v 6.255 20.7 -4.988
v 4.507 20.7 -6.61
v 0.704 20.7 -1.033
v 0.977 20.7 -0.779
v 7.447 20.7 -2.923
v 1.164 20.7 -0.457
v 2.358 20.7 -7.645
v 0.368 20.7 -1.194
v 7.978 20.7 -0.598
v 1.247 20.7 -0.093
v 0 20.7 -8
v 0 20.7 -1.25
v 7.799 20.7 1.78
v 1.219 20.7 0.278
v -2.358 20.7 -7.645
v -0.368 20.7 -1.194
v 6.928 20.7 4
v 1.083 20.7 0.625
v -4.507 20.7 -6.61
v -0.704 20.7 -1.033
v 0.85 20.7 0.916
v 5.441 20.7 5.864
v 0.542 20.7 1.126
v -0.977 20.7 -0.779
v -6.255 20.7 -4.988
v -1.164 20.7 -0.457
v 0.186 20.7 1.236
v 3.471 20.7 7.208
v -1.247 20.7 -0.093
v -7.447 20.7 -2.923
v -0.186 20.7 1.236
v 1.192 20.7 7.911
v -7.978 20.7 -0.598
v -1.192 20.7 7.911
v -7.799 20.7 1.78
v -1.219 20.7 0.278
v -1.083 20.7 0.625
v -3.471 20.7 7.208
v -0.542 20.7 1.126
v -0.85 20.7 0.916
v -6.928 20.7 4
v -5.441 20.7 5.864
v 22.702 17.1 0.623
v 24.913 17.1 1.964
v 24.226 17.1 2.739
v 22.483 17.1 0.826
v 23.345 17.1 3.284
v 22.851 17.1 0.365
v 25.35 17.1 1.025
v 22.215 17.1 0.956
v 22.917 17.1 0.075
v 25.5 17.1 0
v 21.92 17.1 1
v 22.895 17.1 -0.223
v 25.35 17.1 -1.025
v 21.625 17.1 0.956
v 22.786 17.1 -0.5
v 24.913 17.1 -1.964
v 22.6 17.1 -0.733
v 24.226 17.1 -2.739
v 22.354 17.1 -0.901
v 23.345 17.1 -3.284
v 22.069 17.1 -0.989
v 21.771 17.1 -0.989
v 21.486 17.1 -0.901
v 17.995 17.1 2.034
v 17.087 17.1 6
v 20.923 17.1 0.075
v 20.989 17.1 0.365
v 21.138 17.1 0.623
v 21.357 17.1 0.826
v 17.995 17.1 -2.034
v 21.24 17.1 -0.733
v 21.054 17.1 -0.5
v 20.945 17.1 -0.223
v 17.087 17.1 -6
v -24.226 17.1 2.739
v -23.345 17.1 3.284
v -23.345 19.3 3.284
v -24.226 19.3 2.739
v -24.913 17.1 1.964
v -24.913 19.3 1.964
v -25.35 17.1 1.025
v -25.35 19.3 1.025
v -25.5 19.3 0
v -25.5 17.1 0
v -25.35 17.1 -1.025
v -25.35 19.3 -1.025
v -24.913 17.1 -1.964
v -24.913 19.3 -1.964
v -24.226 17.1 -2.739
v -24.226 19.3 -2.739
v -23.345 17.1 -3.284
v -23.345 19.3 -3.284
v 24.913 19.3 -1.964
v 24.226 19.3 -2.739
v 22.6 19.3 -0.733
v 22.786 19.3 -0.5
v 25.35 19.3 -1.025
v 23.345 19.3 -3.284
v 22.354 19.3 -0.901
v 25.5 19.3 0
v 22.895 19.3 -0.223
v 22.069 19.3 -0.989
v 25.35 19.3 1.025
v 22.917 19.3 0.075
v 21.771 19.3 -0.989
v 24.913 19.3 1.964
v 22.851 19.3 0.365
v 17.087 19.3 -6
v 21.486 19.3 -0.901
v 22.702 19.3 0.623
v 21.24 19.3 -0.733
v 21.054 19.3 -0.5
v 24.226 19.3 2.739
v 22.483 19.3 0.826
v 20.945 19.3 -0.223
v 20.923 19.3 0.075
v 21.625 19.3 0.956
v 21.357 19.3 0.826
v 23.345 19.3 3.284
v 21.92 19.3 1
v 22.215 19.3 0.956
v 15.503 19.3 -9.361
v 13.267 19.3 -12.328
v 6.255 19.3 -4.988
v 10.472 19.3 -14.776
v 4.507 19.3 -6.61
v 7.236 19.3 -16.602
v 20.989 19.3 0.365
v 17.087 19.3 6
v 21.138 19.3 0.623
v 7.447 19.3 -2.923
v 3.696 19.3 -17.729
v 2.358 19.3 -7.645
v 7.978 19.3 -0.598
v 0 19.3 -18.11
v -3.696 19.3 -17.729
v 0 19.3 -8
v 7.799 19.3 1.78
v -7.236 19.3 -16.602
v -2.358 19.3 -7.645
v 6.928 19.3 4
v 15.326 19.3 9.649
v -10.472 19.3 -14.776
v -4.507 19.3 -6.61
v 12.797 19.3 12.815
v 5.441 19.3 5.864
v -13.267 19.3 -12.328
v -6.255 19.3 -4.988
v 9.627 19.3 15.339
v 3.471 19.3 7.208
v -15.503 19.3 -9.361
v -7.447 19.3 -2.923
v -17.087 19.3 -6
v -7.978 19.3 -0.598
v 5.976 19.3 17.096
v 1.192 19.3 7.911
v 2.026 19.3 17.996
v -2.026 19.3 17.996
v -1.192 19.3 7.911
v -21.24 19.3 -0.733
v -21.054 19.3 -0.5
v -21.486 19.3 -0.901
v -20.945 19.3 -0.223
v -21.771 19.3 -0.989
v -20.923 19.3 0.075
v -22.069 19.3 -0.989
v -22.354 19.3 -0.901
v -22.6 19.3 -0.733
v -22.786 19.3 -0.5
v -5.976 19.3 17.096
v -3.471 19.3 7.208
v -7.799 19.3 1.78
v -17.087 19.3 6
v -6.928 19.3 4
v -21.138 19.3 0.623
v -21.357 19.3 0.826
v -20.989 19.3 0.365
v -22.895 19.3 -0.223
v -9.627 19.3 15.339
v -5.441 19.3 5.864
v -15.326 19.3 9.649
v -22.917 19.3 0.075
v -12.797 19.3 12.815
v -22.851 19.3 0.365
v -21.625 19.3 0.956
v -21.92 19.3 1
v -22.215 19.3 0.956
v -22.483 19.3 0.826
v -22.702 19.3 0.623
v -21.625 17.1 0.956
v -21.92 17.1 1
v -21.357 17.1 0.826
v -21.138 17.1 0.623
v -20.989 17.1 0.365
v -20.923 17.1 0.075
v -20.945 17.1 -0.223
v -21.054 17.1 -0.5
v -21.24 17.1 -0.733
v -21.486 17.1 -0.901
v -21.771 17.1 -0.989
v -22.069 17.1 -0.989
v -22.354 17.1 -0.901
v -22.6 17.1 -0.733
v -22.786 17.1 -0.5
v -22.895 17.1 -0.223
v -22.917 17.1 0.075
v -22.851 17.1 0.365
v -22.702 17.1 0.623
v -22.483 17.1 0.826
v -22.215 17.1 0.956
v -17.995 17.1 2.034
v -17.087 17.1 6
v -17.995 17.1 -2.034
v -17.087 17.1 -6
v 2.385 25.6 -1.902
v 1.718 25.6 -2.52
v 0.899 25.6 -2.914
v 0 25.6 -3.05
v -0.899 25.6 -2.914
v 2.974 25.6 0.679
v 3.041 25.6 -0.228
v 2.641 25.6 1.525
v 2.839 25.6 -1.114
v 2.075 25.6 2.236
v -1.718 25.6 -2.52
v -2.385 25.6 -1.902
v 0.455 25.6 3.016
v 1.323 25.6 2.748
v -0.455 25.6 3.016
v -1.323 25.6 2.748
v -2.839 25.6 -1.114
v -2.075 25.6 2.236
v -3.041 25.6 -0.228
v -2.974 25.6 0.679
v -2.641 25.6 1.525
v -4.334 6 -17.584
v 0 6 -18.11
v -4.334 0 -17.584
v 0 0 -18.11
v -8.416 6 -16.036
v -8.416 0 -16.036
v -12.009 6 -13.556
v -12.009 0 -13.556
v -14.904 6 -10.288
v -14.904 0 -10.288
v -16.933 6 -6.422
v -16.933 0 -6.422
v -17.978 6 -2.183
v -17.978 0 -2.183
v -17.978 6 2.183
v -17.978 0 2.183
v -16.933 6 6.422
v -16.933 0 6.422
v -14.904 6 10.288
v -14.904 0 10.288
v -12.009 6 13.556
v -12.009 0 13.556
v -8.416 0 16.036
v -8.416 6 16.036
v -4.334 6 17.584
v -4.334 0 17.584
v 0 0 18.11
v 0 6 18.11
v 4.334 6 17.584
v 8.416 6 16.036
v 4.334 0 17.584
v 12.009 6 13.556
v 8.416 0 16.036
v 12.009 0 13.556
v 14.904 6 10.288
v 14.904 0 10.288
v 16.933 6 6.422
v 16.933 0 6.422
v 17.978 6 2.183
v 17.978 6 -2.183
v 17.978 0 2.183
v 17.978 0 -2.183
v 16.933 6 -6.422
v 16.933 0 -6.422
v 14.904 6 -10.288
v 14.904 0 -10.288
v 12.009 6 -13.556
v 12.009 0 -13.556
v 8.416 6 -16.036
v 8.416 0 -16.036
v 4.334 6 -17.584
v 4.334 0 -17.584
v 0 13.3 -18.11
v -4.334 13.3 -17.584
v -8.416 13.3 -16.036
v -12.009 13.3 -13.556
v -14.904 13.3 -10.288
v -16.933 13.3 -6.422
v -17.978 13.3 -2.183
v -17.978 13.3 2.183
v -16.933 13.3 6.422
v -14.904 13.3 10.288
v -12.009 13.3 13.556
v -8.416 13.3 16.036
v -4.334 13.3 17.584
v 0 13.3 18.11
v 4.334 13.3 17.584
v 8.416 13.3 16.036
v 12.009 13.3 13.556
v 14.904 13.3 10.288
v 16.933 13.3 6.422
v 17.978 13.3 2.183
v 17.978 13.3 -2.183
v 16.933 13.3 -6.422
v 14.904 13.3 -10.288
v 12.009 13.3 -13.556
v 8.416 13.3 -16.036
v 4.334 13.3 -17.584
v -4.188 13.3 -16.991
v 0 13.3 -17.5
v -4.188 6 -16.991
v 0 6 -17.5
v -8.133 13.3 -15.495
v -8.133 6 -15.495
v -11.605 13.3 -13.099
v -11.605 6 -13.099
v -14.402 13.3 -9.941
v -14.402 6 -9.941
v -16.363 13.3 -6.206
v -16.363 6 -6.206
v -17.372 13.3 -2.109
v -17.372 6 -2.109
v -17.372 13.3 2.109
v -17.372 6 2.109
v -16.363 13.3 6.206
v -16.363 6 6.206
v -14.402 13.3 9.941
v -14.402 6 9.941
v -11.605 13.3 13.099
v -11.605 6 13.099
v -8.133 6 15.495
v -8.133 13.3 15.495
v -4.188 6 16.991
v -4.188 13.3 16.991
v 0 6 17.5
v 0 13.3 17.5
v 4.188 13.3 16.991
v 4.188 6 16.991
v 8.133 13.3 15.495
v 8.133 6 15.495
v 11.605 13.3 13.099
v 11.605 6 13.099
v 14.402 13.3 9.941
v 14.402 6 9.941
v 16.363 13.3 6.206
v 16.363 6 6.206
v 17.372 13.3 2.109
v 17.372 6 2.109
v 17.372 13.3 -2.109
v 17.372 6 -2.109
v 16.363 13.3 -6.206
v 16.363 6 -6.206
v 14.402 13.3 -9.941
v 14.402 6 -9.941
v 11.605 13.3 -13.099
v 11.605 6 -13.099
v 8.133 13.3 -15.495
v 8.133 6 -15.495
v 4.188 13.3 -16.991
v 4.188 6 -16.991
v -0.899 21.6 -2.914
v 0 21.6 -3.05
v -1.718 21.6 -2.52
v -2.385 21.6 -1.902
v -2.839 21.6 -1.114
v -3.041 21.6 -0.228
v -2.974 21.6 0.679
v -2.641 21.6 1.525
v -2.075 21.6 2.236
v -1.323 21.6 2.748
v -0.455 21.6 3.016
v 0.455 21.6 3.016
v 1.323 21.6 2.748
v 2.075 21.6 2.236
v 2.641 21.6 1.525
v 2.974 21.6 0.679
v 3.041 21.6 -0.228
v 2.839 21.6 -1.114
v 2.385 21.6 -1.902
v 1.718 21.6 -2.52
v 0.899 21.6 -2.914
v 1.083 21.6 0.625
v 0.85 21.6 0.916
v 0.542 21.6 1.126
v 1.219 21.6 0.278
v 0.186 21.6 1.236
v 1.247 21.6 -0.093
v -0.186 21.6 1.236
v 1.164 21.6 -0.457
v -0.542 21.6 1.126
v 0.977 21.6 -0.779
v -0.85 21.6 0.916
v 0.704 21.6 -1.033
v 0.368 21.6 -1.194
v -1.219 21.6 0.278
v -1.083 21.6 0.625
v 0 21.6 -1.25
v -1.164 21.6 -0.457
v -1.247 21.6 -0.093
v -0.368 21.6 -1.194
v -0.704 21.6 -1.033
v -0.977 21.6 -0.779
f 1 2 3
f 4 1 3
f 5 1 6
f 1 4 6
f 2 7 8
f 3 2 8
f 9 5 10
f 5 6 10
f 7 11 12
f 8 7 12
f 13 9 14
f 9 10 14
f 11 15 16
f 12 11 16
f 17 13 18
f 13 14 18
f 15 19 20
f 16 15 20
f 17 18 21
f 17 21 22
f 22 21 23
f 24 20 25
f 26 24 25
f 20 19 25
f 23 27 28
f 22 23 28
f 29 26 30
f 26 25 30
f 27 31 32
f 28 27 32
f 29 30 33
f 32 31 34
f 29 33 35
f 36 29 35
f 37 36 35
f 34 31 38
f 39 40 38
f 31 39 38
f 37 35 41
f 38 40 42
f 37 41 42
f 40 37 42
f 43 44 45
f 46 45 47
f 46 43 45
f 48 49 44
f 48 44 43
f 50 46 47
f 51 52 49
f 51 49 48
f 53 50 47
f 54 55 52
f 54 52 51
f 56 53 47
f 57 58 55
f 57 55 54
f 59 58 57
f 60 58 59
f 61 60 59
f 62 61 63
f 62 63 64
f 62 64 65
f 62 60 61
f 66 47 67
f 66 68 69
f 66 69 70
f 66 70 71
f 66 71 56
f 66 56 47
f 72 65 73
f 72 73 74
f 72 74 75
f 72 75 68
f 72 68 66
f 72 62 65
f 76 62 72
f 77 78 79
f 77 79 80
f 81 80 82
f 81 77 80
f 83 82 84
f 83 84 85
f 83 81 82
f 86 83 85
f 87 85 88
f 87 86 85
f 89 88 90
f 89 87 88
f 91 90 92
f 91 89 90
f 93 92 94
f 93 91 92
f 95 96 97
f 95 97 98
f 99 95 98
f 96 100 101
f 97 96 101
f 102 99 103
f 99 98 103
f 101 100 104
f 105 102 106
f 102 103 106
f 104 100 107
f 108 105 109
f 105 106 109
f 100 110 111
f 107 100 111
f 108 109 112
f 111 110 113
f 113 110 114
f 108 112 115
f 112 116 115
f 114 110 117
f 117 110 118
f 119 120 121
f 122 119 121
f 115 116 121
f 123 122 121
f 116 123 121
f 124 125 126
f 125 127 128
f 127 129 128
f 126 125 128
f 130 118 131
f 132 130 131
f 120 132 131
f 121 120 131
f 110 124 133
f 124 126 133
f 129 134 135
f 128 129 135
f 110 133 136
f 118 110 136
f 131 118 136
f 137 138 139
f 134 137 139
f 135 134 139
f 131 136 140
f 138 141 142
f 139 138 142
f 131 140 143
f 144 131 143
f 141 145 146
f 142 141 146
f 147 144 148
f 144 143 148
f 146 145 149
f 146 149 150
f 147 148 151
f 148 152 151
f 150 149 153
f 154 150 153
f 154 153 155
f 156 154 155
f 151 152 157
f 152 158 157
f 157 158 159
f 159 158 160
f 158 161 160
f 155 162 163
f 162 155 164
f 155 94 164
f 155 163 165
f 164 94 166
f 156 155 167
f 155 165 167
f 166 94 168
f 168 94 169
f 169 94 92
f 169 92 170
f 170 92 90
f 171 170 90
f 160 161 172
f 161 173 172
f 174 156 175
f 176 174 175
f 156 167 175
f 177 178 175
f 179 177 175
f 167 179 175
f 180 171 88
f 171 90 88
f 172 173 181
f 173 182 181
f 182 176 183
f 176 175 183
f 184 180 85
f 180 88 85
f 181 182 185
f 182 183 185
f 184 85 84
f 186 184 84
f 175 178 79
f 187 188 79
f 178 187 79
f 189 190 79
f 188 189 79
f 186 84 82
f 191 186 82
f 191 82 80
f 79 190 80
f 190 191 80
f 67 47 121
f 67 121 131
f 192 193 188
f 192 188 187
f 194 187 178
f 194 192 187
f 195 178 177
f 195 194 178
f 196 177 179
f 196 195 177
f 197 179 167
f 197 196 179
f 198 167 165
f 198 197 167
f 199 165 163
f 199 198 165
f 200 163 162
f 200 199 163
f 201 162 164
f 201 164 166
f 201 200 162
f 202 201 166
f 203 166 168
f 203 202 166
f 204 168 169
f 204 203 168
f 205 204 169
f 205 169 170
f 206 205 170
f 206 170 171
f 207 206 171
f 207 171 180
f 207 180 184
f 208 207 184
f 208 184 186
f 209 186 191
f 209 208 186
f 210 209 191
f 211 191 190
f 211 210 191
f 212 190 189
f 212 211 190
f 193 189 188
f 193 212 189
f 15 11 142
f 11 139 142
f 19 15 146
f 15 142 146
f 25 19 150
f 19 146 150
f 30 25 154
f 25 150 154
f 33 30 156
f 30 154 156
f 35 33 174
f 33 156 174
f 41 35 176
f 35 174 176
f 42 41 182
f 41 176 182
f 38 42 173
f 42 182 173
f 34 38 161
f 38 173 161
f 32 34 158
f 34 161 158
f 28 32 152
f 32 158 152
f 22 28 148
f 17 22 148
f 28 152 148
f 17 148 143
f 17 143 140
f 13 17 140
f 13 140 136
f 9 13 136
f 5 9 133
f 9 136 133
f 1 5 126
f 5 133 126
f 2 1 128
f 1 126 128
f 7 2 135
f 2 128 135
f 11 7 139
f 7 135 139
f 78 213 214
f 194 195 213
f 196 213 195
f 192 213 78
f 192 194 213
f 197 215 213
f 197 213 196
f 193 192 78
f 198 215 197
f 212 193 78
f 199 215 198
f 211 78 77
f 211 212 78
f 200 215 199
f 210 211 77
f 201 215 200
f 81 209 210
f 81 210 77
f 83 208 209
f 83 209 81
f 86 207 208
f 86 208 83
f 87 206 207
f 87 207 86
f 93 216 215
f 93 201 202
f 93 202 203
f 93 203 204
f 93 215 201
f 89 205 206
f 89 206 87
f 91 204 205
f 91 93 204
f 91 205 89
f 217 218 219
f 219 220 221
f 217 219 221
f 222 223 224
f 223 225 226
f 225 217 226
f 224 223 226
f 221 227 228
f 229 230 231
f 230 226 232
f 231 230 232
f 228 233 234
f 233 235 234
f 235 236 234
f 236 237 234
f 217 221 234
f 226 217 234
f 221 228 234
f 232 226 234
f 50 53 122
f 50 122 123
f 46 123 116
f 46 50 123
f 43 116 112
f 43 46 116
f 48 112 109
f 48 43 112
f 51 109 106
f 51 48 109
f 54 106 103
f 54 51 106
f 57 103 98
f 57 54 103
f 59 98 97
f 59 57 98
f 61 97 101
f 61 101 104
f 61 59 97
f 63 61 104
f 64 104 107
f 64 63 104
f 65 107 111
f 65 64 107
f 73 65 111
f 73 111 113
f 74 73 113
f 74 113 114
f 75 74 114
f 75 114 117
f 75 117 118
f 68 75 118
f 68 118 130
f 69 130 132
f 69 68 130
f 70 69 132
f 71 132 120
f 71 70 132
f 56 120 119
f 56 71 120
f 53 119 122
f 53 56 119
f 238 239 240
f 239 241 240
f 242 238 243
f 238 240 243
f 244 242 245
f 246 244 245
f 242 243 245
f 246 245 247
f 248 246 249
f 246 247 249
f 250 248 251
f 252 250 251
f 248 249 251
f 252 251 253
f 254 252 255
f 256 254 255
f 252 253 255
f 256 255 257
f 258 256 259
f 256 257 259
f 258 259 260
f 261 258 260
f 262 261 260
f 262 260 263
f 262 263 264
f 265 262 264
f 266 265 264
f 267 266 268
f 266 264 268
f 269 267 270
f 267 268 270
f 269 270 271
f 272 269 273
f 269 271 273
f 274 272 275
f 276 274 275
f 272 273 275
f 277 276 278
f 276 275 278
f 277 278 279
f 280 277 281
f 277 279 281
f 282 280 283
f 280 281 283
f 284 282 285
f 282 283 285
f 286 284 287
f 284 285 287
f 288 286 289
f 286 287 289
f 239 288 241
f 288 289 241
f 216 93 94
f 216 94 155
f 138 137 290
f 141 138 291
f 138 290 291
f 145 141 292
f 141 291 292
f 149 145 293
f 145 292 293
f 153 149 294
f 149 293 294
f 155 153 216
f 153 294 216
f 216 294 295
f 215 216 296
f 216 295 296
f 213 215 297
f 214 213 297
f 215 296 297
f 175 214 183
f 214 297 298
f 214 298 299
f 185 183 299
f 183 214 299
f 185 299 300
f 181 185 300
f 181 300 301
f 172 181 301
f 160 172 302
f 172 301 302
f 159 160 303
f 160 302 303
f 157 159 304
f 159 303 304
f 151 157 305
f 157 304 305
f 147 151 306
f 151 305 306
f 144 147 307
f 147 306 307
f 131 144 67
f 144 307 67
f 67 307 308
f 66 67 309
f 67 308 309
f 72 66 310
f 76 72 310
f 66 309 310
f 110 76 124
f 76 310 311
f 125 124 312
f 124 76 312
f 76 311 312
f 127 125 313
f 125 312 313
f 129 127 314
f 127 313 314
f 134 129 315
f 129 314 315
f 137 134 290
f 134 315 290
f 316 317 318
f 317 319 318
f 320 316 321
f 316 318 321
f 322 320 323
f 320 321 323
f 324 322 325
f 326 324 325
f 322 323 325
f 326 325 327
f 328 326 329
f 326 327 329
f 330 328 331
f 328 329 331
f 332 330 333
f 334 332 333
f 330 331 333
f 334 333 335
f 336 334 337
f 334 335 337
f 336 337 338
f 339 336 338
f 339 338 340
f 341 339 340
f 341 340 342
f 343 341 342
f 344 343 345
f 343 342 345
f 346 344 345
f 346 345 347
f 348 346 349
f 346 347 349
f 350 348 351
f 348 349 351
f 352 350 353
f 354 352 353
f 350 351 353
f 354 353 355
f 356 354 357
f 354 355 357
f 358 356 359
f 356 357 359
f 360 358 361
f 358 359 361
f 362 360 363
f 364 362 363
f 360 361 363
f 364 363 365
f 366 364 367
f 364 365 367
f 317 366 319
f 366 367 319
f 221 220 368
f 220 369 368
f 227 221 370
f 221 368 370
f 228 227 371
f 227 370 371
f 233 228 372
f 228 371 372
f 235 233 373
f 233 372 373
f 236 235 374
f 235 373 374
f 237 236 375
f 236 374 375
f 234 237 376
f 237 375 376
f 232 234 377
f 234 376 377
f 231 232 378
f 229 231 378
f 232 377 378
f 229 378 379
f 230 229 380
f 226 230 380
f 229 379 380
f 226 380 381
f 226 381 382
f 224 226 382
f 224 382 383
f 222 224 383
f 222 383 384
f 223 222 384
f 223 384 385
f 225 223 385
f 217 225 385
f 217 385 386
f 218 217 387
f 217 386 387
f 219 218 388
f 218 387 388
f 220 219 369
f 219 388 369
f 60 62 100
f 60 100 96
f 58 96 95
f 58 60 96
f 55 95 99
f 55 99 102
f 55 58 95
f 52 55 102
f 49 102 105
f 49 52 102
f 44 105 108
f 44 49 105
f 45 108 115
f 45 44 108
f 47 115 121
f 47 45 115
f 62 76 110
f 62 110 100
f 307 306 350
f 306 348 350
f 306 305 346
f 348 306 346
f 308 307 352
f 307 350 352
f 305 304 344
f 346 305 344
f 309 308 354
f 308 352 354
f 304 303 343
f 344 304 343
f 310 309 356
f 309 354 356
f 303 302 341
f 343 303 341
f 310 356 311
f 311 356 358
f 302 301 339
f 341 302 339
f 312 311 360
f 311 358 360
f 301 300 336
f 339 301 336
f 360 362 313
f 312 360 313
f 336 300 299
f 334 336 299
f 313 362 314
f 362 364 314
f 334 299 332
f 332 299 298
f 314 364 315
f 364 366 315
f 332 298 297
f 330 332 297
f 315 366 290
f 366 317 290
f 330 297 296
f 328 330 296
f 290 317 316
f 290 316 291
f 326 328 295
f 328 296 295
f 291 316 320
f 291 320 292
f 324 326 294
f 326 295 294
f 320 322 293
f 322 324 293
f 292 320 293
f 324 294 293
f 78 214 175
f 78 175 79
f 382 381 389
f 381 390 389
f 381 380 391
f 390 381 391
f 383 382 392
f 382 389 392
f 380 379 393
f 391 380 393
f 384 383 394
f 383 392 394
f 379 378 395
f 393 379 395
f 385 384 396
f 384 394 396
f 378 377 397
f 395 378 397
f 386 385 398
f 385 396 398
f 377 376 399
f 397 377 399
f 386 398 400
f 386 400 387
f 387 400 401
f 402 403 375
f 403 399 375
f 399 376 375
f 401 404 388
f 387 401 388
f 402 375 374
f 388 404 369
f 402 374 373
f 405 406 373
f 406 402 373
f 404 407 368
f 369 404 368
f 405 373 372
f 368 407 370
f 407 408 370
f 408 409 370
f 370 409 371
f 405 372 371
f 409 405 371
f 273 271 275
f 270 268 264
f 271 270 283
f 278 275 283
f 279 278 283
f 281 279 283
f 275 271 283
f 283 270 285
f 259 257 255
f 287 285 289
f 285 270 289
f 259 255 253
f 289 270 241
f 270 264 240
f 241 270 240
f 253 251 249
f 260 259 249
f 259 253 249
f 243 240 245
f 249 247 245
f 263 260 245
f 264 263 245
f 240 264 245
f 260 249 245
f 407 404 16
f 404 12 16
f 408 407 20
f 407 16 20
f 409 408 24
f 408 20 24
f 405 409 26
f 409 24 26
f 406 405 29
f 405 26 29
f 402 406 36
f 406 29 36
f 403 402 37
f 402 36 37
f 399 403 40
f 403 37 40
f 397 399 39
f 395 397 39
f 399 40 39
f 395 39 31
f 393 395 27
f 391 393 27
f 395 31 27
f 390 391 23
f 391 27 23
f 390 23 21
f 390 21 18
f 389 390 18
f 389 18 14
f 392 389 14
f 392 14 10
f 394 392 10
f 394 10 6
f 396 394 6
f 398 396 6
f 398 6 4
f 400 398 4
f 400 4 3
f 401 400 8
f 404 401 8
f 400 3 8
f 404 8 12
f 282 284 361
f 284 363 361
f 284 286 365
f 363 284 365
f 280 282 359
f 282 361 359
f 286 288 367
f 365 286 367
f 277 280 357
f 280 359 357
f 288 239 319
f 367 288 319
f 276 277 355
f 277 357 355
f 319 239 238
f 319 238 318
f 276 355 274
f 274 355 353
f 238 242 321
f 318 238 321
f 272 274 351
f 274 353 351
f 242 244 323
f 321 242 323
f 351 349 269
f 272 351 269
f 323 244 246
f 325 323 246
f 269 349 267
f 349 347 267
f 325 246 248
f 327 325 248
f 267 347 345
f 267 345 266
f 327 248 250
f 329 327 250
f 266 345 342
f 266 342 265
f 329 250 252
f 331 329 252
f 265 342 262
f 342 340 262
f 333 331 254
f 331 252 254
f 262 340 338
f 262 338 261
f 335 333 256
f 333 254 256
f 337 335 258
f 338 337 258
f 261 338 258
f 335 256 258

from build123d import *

# Parameters (mm, degrees)
BOSS_EXTRUDE1_START = -2.2
SKETCH2_R           = 1
BOSS_EXTRUDE1_DEPTH = 2.2


with BuildPart() as part:
    # Sketch1 → Revolve1 (revolve)
    with BuildSketch(Plane.XY, mode=Mode.PRIVATE) as revolve1_sk:
        Polygon((0, 25.6), (3.05, 25.6), (3.05, 21.6), (1.25, 21.6), (1.25, 20.7), (8, 20.7), (8, 19.3), (18.11, 19.3), (18.11, 13.3), (17.5, 13.3), (17.5, 6), (18.11, 6), (18.11, 0), (0, 0), align=None)
    revolve(revolve1_sk.sketch.rotate(Axis((0, 0, 0), (0, 1, 0)), 90), axis=Axis((0, 0, 0), (0, 1, 0)))

    # Sketch2 → Boss-Extrude1 (add)
    # profile 1 of 2: a face of its own
    with BuildSketch(Plane(origin=(0, 19.3, 0), x_dir=(1, 0, 0), z_dir=(0, 1, 0)).offset(BOSS_EXTRUDE1_START)):
        with BuildLine():
            Line((-23.3452514, 3.284061273), (-17.087191109, 6))
            ThreePointArc((-17.087191109, 6), (-18.11, 0), (-17.087191109, -6))
            Line((-17.087191109, -6), (-23.3452514, -3.284061273))
            ThreePointArc((-23.3452514, -3.284061273), (-25.5, 0), (-23.3452514, 3.284061273))
        make_face()
        with Locations(Location((-21.92, 0, 0), (0, 0, 270))):
            Circle(SKETCH2_R, mode=Mode.SUBTRACT)
    # profile 2 of 2: a face of its own
    with BuildSketch(Plane(origin=(0, 19.3, 0), x_dir=(1, 0, 0), z_dir=(0, 1, 0)).offset(BOSS_EXTRUDE1_START)):
        with BuildLine():
            Line((17.087191109, 6), (23.3452514, 3.284061273))
            ThreePointArc((23.3452514, 3.284061273), (25.5, 0), (23.3452514, -3.284061273))
            Line((23.3452514, -3.284061273), (17.087191109, -6))
            ThreePointArc((17.087191109, -6), (18.11, 0), (17.087191109, 6))
        make_face()
        with Locations(Location((21.92, 0, 0), (0, 0, 270))):
            Circle(SKETCH2_R, mode=Mode.SUBTRACT)
    extrude(amount=BOSS_EXTRUDE1_DEPTH)


solid = part.part
